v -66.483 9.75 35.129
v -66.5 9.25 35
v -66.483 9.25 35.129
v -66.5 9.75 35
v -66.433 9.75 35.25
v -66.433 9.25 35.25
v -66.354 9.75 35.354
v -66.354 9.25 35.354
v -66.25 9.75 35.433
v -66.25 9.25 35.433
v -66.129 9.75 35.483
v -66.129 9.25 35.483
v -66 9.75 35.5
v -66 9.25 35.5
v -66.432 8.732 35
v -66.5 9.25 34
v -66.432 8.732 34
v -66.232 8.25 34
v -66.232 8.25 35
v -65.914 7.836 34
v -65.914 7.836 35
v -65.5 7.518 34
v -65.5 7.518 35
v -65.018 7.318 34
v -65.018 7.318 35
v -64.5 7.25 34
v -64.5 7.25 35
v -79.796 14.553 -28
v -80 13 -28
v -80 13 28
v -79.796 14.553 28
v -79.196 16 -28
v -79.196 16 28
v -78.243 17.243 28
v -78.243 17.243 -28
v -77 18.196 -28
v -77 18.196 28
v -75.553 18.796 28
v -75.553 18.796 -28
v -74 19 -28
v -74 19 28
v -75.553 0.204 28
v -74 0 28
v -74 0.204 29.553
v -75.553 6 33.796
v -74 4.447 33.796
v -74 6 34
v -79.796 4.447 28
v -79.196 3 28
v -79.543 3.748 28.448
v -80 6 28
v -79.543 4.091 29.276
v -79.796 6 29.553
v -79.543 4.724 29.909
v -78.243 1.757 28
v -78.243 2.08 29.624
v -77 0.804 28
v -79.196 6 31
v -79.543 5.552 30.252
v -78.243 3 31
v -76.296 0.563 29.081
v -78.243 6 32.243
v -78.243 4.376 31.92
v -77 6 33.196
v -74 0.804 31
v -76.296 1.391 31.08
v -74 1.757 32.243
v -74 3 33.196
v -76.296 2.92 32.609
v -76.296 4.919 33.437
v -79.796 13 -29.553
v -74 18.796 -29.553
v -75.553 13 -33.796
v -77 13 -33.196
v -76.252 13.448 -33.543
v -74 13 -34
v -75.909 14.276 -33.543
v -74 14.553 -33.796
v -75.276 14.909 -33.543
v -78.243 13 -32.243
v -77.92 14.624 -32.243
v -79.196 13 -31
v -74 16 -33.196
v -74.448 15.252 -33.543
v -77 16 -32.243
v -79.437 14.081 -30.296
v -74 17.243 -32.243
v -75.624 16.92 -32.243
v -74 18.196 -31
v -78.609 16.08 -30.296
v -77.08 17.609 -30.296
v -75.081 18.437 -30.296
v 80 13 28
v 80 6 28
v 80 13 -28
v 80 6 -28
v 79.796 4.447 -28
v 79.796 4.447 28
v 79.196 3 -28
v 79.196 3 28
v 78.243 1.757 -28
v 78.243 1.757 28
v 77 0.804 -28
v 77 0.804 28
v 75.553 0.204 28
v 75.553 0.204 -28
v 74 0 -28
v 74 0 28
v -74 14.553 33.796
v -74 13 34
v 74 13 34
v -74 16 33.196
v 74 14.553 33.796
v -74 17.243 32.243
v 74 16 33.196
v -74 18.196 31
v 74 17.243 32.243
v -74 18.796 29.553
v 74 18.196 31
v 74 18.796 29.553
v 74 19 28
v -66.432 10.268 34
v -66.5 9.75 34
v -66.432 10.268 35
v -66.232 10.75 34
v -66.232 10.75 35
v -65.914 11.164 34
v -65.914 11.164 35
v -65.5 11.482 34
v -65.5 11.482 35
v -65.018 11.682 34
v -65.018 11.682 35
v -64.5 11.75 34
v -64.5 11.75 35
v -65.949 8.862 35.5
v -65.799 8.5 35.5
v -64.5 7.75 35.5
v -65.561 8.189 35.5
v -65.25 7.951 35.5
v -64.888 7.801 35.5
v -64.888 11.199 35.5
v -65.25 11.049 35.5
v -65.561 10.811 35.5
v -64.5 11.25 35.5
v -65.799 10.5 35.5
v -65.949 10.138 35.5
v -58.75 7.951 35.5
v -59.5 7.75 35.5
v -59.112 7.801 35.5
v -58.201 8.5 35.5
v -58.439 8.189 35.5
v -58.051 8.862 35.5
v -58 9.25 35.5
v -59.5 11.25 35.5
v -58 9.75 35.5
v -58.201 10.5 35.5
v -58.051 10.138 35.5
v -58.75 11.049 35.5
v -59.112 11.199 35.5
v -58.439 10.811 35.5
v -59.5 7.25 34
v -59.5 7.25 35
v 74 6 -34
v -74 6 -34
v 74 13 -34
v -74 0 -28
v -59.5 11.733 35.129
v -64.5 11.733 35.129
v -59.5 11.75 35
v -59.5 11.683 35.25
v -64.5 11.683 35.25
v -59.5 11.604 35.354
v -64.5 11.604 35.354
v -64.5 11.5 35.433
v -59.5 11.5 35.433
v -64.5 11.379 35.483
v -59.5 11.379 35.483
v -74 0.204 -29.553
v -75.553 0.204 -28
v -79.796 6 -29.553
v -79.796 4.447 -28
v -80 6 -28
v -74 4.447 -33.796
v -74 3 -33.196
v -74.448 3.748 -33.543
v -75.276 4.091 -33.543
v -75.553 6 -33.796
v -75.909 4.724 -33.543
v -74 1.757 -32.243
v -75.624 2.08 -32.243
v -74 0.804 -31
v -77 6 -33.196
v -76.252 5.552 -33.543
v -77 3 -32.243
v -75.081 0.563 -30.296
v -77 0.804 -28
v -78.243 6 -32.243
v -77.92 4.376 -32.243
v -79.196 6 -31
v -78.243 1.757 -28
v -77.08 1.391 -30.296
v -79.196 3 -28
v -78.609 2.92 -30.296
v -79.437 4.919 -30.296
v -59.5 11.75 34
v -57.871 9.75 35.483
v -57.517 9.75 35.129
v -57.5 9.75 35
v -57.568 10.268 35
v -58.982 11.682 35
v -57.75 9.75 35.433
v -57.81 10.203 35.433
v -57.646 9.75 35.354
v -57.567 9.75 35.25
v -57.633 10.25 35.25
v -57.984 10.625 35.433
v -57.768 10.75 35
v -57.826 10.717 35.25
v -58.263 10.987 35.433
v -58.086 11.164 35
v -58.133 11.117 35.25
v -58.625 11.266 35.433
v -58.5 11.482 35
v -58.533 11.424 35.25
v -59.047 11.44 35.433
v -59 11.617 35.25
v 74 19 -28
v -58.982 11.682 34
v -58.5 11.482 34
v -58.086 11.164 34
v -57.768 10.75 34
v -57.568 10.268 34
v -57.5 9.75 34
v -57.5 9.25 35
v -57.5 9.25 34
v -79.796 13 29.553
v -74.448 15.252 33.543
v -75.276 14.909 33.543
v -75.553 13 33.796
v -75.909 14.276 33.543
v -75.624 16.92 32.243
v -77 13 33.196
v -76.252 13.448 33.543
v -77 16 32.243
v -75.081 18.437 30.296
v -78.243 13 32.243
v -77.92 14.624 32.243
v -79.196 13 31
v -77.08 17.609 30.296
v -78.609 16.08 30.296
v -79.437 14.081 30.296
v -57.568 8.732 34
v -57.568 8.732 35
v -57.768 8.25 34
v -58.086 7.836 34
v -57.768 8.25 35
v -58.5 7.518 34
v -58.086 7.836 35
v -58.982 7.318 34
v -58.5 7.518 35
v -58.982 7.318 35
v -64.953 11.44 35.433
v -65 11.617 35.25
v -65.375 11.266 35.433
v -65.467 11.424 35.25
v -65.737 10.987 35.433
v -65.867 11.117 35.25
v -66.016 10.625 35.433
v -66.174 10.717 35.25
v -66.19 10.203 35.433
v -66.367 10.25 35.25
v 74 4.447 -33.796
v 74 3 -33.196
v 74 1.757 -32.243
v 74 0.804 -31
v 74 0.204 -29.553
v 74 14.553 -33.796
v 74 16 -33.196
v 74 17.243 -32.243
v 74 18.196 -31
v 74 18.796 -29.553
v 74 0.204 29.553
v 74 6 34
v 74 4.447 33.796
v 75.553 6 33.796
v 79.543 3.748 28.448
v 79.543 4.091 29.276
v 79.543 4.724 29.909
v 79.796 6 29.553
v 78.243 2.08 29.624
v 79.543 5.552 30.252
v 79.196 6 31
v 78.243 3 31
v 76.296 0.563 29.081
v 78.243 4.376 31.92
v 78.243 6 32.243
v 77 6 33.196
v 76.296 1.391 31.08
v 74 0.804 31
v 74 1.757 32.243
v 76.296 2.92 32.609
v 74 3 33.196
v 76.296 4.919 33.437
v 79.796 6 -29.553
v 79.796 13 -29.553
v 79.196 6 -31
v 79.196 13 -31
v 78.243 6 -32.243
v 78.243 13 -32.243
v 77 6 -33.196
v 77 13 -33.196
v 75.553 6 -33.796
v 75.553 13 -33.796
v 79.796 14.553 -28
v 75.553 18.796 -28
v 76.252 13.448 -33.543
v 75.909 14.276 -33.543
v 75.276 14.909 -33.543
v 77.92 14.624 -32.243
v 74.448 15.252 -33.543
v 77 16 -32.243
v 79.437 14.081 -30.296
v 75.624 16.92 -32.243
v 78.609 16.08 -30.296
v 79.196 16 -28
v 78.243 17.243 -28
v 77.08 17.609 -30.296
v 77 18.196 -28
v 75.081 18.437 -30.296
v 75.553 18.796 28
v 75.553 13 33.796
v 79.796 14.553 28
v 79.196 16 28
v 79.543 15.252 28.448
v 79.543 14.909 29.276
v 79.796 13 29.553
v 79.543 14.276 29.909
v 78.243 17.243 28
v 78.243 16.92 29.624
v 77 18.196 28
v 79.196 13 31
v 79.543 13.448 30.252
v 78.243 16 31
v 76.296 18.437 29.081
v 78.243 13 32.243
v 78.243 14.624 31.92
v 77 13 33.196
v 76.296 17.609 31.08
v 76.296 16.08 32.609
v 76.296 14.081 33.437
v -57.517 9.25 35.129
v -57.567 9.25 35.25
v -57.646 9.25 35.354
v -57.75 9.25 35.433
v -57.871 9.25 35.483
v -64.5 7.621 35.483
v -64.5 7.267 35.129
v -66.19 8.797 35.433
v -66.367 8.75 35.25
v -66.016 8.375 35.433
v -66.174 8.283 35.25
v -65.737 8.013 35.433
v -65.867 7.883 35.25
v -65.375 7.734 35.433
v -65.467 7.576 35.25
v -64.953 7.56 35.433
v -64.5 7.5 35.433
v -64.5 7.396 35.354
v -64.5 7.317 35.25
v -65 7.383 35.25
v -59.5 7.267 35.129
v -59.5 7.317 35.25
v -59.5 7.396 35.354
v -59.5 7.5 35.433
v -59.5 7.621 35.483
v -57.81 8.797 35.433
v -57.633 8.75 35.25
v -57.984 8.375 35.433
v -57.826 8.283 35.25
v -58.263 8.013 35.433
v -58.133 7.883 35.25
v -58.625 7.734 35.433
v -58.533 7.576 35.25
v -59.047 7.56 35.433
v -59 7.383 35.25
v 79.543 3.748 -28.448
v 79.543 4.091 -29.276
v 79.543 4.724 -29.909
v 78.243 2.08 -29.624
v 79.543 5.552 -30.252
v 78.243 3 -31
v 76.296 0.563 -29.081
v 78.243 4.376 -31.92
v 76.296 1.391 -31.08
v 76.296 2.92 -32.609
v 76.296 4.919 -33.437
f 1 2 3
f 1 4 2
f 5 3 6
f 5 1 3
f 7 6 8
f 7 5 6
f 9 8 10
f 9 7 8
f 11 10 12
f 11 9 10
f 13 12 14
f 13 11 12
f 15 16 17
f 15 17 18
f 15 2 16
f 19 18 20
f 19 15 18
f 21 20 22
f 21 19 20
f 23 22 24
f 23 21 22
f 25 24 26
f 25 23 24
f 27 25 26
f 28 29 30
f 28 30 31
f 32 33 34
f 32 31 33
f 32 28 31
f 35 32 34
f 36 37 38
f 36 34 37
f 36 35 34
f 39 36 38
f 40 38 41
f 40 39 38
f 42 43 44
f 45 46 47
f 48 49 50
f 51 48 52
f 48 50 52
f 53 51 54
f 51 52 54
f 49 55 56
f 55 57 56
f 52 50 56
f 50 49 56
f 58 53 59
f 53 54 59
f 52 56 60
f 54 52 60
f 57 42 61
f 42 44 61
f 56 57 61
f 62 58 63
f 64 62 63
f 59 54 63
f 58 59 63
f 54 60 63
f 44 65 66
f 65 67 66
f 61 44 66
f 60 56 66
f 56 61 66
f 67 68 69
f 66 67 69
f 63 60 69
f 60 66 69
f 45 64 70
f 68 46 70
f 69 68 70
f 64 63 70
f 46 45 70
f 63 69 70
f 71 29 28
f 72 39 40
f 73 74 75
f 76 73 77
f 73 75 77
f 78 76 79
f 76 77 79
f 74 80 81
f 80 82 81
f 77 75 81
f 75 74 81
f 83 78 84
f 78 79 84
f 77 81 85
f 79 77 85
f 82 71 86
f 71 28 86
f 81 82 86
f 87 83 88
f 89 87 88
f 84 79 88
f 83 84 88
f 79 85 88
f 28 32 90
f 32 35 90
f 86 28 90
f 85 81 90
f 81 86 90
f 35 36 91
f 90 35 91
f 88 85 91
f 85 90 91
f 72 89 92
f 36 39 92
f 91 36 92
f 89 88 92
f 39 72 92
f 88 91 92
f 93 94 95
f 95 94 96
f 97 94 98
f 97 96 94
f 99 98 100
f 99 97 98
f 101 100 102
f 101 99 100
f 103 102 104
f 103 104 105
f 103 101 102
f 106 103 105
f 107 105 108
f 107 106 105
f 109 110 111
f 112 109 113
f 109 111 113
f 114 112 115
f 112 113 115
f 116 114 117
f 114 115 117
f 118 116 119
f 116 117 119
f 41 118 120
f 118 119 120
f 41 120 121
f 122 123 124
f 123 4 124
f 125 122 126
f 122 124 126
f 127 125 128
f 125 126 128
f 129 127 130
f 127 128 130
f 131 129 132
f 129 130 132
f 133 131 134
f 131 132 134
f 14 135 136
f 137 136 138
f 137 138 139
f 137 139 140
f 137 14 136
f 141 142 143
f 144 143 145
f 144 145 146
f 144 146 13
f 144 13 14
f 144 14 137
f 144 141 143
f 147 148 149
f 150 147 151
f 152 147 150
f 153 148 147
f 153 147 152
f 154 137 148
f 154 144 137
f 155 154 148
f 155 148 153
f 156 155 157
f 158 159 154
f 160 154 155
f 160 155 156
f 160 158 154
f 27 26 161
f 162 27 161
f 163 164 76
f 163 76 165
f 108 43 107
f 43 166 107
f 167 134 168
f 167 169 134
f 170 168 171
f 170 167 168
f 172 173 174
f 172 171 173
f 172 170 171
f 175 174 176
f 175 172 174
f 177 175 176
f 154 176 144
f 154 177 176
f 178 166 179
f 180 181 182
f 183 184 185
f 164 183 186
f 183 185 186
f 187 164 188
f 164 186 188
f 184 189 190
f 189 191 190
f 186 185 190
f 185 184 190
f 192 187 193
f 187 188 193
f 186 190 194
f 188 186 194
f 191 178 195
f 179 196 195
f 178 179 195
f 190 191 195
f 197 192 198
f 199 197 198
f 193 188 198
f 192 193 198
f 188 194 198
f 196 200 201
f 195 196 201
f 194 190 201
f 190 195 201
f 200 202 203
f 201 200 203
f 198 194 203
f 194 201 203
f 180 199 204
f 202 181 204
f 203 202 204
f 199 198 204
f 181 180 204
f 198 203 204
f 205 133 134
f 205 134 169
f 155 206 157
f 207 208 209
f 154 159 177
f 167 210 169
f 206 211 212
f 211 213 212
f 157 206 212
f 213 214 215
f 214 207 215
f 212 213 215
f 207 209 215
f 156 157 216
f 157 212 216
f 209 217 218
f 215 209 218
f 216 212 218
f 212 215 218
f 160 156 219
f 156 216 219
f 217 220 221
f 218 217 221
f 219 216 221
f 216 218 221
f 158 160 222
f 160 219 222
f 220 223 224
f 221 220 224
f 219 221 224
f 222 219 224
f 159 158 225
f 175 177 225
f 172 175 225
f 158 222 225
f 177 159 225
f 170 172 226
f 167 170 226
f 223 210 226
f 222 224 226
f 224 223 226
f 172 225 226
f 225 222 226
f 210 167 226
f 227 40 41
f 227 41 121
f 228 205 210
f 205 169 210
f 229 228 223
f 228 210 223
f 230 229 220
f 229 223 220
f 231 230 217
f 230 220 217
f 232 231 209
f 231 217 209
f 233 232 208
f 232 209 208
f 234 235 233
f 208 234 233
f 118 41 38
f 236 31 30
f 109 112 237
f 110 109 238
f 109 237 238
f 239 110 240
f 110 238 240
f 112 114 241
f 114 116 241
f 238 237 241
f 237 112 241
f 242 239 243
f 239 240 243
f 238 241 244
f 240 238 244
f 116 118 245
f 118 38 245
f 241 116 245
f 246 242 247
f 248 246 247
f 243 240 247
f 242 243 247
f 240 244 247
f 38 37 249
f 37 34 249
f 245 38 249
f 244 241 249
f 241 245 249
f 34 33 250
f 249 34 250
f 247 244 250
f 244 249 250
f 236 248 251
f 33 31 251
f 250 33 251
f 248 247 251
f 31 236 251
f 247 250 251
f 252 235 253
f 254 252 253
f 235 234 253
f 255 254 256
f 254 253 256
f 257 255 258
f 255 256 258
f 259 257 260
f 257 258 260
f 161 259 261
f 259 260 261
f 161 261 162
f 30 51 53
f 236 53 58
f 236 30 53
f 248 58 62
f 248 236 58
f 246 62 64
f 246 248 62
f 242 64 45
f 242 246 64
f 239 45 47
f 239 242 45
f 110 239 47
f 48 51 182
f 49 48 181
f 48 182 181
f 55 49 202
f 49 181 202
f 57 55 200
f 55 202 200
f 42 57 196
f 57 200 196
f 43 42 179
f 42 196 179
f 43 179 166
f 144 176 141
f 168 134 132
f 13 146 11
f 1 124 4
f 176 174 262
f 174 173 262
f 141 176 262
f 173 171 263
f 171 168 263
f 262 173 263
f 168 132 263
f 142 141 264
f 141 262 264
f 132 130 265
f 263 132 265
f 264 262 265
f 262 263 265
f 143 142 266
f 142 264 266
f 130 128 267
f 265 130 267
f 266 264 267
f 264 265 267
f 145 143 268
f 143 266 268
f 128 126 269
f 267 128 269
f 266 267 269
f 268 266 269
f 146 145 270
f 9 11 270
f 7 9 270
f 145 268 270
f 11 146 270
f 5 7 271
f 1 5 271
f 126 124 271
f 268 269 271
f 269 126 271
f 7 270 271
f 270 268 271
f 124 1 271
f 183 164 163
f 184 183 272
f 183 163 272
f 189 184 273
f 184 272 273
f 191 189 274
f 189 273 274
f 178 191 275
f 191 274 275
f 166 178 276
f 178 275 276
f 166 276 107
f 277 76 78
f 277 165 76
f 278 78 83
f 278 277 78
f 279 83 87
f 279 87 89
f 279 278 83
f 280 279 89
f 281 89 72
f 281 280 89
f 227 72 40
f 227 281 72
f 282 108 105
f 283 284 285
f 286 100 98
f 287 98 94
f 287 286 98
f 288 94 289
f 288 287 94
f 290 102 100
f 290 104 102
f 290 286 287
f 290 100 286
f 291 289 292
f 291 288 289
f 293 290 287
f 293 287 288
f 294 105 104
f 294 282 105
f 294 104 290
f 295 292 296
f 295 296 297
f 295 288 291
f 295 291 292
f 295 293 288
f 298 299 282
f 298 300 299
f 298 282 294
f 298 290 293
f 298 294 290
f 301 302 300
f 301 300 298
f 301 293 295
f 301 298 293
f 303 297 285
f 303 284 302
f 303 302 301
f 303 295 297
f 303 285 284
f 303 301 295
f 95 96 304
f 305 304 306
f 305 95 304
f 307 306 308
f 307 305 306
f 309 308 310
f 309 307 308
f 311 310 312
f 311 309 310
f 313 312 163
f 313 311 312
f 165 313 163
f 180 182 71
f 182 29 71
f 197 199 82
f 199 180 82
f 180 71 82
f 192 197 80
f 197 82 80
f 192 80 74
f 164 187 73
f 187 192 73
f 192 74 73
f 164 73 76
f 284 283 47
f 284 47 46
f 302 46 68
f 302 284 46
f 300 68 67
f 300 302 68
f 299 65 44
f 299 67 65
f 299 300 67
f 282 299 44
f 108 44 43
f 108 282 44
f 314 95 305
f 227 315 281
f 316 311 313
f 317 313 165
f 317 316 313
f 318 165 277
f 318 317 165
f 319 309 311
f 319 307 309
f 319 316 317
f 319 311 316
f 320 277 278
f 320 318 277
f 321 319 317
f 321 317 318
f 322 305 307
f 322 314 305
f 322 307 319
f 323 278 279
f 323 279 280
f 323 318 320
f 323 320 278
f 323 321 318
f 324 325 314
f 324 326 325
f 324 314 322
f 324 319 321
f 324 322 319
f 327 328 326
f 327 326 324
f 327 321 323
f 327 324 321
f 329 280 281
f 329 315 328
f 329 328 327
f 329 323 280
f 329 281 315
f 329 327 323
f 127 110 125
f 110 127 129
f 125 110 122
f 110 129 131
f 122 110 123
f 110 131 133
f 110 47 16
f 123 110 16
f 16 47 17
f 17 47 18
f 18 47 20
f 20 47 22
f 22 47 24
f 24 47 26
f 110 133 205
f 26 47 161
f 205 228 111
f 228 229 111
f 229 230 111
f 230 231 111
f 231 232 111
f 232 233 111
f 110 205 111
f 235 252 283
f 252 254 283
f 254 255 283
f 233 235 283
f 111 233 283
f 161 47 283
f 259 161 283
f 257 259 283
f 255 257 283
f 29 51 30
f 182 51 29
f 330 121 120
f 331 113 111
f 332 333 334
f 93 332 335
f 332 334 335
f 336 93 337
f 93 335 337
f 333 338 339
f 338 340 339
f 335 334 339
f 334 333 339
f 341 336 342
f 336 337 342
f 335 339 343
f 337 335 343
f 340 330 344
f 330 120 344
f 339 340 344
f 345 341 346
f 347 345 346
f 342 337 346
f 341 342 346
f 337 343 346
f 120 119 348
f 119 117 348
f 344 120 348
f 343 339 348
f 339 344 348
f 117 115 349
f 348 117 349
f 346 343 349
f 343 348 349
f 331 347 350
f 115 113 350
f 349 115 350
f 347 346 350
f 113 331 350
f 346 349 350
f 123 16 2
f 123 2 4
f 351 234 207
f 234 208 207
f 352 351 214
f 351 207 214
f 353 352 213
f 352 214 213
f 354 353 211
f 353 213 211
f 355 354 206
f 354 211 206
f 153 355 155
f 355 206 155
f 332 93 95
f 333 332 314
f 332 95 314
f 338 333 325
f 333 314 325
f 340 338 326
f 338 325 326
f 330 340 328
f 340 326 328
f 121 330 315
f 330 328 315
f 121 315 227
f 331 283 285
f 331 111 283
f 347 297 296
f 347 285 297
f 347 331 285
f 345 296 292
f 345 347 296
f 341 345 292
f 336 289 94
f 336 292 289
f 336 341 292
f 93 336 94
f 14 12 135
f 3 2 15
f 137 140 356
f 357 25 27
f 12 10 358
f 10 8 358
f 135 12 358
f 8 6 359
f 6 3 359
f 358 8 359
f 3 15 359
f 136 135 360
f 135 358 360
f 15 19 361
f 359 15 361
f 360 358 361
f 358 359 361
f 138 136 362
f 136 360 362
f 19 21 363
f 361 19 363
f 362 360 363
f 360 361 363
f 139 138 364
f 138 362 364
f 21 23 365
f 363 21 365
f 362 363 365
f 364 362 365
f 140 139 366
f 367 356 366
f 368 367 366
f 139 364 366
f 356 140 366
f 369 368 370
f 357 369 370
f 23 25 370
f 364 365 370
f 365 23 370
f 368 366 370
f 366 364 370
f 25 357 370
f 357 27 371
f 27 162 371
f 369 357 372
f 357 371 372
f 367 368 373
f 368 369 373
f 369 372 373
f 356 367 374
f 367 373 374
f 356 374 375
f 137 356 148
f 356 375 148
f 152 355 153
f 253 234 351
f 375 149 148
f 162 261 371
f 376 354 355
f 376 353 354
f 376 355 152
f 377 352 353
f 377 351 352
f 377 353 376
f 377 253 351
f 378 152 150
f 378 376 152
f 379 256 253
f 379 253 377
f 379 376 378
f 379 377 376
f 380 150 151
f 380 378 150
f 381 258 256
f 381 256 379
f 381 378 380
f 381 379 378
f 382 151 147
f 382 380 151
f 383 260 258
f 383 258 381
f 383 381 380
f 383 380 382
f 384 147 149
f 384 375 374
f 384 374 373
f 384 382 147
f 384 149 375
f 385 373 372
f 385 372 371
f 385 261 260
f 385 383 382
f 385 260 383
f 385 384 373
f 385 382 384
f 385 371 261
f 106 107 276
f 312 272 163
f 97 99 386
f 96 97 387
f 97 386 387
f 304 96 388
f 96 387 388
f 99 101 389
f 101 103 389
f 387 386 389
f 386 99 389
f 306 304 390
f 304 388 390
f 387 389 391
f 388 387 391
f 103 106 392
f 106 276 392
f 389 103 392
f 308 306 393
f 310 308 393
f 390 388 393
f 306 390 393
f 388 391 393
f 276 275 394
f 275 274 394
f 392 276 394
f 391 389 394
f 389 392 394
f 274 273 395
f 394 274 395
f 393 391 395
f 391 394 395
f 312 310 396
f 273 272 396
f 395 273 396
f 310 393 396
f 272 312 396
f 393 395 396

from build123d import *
from OCP.BRepFilletAPI import BRepFilletAPI_MakeFillet

# Parameters (mm, degrees)
SKETCH1_W           = 160
SKETCH1_H           = 68
BOSS_EXTRUDE1_DEPTH = 19
FILLET1_R           = 6
SKETCH2_W           = 9
SKETCH2_H           = 4.5
BOSS_EXTRUDE2_DEPTH = 1.5
FILLET2_R1          = 2
FILLET2_R2          = 0.5


with BuildPart() as part:
    # Sketch1 → Boss-Extrude1 (new body)
    with BuildSketch(Plane(origin=(0, 0, 0), x_dir=(1, 0, 0), z_dir=(0, 1, 0))):
        Rectangle(SKETCH1_W, SKETCH1_H)
    extrude(amount=BOSS_EXTRUDE1_DEPTH)

    # Fillet1
    fillet1_edges = [part.edges().sort_by_distance(p)[0] for p in [
        (-80, 19, 0),
        (0, 19, 34),
        (80, 19, 0),
        (0, 0, 34),
        (-80, 0, 0),
        (0, 0, -34),
        (80, 0, 0),
        (80, 9.5, 34),
        (-80, 9.5, 34),
        (-80, 9.5, -34),
        (80, 9.5, -34),
        (0, 19, -34),
    ]]
    fillet(fillet1_edges, radius=FILLET1_R)

    # Sketch2 → Boss-Extrude2 (add)
    with BuildSketch(Plane.XY.offset(34)):
        with Locations((-62, 9.5)):
            Rectangle(SKETCH2_W, SKETCH2_H)
    extrude(amount=BOSS_EXTRUDE2_DEPTH)

    # Fillet2: one fillet with a radius per group of edges: ONE call of the kernel's fillet builder (fillet() takes one radius for all edges)
    fillet2_edges_1 = [part.edges().sort_by_distance(p)[0] for p in [
        (-57.5, 7.25, 34.75),
        (-57.5, 11.75, 34.75),
        (-66.5, 11.75, 34.75),
        (-66.5, 7.25, 34.75),
    ]]
    fillet2_edges_2 = [part.edges().sort_by_distance(p)[0] for p in [
        (-57.5, 9.5, 35.5),
        (-62, 11.75, 35.5),
        (-66.5, 9.5, 35.5),
        (-62, 7.25, 35.5),
    ]]
    fillet2 = BRepFilletAPI_MakeFillet(part.part.solid().wrapped)
    for e in fillet2_edges_1:
        fillet2.Add(FILLET2_R1, e.wrapped)
    for e in fillet2_edges_2:
        fillet2.Add(FILLET2_R2, e.wrapped)
    add(Compound.cast(fillet2.Shape()), mode=Mode.REPLACE)


solid = part.part
